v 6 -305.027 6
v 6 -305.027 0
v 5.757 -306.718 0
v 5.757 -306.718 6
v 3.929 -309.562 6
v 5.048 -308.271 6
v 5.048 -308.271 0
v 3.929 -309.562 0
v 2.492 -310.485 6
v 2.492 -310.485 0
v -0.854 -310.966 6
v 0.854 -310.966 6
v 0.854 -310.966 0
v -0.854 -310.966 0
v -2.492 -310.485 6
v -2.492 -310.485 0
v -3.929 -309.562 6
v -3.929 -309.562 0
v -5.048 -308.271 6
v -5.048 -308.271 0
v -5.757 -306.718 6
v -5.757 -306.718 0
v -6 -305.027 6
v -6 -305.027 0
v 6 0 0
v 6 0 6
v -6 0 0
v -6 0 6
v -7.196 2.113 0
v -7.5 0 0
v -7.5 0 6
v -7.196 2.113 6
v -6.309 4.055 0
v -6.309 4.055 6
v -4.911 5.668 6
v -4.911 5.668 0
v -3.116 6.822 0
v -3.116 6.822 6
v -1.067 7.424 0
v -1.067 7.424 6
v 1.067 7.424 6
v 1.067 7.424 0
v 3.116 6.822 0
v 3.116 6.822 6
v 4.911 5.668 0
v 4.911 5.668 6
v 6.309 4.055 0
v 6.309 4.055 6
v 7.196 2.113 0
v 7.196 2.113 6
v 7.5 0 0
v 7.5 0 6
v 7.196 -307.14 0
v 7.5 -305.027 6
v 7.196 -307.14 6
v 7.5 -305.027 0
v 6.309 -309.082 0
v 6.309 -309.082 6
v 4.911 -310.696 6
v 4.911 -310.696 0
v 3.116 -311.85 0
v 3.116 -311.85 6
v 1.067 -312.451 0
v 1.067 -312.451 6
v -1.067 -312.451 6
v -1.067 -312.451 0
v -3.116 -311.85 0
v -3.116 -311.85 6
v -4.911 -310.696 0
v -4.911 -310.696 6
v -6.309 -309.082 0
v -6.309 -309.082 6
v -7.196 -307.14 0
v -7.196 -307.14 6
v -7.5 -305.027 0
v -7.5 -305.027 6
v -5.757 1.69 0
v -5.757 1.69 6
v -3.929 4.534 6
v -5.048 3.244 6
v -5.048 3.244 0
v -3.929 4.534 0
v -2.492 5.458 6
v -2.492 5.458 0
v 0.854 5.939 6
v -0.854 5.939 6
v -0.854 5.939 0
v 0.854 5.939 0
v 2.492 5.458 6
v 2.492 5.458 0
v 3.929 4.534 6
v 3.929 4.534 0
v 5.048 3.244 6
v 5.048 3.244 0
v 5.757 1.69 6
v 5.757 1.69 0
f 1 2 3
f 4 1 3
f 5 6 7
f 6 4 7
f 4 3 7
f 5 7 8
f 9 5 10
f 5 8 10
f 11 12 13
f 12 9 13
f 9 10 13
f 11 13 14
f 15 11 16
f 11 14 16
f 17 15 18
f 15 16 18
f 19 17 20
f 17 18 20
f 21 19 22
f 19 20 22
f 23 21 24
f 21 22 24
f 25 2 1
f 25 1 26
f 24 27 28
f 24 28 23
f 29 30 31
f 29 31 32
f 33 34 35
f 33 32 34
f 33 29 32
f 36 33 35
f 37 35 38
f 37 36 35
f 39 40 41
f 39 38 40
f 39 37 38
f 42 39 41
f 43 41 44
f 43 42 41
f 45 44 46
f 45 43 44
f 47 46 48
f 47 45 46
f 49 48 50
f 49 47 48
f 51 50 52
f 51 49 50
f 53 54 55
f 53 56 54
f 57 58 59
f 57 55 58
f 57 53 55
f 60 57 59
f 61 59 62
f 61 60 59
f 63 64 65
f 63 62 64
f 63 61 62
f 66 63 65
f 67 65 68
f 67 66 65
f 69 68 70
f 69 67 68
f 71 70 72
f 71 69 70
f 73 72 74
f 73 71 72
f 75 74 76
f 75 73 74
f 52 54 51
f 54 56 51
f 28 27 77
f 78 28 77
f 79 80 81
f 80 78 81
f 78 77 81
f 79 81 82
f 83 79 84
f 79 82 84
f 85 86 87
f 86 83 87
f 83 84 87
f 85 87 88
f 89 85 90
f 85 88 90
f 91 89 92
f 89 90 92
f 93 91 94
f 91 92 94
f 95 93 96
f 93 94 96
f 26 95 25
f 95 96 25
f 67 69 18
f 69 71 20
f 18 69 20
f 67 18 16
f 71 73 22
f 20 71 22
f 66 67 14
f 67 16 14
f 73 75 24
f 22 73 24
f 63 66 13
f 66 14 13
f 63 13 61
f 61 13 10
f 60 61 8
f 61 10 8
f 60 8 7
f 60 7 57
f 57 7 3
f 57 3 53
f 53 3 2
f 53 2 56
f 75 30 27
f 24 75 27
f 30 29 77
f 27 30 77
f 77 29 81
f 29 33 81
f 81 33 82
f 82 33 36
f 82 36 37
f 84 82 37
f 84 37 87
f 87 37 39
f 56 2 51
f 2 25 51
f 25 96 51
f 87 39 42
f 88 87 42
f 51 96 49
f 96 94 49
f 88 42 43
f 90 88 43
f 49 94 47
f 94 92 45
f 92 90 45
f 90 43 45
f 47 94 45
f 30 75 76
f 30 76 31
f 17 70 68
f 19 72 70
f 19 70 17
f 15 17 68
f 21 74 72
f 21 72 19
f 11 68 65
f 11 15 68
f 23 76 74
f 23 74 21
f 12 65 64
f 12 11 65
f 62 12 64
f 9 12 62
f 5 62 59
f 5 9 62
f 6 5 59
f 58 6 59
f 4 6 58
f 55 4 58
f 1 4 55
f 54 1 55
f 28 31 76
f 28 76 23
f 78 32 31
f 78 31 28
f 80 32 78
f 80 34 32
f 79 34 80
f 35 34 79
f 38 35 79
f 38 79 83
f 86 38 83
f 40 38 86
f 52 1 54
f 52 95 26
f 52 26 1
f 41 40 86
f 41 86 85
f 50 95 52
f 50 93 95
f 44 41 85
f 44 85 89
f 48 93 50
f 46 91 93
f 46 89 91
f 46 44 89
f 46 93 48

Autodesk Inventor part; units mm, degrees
ref_plane "YZ Plane" through (0, 0, 0) normal (1, 0, 0) x (0, 1, 0)
ref_plane "XZ Plane" through (0, 0, 0) normal (0, 1, 0) x (-1, 0, 0)
ref_plane "XY Plane" through (0, 0, 0) normal (0, 0, 1) x (1, 0, 0)
sketch "Skizze1" plane through (0, 0, 0) normal (0, 0, 1) x (1, 0, 0)
  arc A0 (6, 0) -> (-6, 0) centre (0, 0) ccw
  arc A1 (7.5, 0) -> (-7.5, 0) centre (0, 0) ccw
  arc A2 (-6, -305.0274) -> (6, -305.0274) centre (0, -305.0274) ccw
  line L0 (0, -305.0274) -> (6, -305.0274) construction
  line L1 (0, -305.0274) -> (-6, -305.0274) construction
  arc A3 (-7.5, -305.0274) -> (7.5, -305.0274) centre (0, -305.0274) ccw
  line L2 (0, -305.0274) -> (7.5, -305.0274) construction
  line L3 (0, -305.0274) -> (-7.5, -305.0274) construction
  line L4 (-7.5, -305.0274) -> (-7.5, 0)
  line L5 (-6, 0) -> (-6, -305.0274)
  line L6 (6, -305.0274) -> (6, 0)
  line L7 (7.5, -305.0274) -> (7.5, 0)
  dimension "d0" = 6
  dimension "d1" = 7.5
  dimension "d2" = 6
  dimension "d3" = 180
  dimension "d4" = 7.5
  dimension "d5" = 180
  dimension "d6" = 305.0274
  dimension "d7" = 0
extrude "Extrusion1" add sketch "Skizze1" along normal blind 6
properties part number "Y belt" material "Gummi, Silikon"
